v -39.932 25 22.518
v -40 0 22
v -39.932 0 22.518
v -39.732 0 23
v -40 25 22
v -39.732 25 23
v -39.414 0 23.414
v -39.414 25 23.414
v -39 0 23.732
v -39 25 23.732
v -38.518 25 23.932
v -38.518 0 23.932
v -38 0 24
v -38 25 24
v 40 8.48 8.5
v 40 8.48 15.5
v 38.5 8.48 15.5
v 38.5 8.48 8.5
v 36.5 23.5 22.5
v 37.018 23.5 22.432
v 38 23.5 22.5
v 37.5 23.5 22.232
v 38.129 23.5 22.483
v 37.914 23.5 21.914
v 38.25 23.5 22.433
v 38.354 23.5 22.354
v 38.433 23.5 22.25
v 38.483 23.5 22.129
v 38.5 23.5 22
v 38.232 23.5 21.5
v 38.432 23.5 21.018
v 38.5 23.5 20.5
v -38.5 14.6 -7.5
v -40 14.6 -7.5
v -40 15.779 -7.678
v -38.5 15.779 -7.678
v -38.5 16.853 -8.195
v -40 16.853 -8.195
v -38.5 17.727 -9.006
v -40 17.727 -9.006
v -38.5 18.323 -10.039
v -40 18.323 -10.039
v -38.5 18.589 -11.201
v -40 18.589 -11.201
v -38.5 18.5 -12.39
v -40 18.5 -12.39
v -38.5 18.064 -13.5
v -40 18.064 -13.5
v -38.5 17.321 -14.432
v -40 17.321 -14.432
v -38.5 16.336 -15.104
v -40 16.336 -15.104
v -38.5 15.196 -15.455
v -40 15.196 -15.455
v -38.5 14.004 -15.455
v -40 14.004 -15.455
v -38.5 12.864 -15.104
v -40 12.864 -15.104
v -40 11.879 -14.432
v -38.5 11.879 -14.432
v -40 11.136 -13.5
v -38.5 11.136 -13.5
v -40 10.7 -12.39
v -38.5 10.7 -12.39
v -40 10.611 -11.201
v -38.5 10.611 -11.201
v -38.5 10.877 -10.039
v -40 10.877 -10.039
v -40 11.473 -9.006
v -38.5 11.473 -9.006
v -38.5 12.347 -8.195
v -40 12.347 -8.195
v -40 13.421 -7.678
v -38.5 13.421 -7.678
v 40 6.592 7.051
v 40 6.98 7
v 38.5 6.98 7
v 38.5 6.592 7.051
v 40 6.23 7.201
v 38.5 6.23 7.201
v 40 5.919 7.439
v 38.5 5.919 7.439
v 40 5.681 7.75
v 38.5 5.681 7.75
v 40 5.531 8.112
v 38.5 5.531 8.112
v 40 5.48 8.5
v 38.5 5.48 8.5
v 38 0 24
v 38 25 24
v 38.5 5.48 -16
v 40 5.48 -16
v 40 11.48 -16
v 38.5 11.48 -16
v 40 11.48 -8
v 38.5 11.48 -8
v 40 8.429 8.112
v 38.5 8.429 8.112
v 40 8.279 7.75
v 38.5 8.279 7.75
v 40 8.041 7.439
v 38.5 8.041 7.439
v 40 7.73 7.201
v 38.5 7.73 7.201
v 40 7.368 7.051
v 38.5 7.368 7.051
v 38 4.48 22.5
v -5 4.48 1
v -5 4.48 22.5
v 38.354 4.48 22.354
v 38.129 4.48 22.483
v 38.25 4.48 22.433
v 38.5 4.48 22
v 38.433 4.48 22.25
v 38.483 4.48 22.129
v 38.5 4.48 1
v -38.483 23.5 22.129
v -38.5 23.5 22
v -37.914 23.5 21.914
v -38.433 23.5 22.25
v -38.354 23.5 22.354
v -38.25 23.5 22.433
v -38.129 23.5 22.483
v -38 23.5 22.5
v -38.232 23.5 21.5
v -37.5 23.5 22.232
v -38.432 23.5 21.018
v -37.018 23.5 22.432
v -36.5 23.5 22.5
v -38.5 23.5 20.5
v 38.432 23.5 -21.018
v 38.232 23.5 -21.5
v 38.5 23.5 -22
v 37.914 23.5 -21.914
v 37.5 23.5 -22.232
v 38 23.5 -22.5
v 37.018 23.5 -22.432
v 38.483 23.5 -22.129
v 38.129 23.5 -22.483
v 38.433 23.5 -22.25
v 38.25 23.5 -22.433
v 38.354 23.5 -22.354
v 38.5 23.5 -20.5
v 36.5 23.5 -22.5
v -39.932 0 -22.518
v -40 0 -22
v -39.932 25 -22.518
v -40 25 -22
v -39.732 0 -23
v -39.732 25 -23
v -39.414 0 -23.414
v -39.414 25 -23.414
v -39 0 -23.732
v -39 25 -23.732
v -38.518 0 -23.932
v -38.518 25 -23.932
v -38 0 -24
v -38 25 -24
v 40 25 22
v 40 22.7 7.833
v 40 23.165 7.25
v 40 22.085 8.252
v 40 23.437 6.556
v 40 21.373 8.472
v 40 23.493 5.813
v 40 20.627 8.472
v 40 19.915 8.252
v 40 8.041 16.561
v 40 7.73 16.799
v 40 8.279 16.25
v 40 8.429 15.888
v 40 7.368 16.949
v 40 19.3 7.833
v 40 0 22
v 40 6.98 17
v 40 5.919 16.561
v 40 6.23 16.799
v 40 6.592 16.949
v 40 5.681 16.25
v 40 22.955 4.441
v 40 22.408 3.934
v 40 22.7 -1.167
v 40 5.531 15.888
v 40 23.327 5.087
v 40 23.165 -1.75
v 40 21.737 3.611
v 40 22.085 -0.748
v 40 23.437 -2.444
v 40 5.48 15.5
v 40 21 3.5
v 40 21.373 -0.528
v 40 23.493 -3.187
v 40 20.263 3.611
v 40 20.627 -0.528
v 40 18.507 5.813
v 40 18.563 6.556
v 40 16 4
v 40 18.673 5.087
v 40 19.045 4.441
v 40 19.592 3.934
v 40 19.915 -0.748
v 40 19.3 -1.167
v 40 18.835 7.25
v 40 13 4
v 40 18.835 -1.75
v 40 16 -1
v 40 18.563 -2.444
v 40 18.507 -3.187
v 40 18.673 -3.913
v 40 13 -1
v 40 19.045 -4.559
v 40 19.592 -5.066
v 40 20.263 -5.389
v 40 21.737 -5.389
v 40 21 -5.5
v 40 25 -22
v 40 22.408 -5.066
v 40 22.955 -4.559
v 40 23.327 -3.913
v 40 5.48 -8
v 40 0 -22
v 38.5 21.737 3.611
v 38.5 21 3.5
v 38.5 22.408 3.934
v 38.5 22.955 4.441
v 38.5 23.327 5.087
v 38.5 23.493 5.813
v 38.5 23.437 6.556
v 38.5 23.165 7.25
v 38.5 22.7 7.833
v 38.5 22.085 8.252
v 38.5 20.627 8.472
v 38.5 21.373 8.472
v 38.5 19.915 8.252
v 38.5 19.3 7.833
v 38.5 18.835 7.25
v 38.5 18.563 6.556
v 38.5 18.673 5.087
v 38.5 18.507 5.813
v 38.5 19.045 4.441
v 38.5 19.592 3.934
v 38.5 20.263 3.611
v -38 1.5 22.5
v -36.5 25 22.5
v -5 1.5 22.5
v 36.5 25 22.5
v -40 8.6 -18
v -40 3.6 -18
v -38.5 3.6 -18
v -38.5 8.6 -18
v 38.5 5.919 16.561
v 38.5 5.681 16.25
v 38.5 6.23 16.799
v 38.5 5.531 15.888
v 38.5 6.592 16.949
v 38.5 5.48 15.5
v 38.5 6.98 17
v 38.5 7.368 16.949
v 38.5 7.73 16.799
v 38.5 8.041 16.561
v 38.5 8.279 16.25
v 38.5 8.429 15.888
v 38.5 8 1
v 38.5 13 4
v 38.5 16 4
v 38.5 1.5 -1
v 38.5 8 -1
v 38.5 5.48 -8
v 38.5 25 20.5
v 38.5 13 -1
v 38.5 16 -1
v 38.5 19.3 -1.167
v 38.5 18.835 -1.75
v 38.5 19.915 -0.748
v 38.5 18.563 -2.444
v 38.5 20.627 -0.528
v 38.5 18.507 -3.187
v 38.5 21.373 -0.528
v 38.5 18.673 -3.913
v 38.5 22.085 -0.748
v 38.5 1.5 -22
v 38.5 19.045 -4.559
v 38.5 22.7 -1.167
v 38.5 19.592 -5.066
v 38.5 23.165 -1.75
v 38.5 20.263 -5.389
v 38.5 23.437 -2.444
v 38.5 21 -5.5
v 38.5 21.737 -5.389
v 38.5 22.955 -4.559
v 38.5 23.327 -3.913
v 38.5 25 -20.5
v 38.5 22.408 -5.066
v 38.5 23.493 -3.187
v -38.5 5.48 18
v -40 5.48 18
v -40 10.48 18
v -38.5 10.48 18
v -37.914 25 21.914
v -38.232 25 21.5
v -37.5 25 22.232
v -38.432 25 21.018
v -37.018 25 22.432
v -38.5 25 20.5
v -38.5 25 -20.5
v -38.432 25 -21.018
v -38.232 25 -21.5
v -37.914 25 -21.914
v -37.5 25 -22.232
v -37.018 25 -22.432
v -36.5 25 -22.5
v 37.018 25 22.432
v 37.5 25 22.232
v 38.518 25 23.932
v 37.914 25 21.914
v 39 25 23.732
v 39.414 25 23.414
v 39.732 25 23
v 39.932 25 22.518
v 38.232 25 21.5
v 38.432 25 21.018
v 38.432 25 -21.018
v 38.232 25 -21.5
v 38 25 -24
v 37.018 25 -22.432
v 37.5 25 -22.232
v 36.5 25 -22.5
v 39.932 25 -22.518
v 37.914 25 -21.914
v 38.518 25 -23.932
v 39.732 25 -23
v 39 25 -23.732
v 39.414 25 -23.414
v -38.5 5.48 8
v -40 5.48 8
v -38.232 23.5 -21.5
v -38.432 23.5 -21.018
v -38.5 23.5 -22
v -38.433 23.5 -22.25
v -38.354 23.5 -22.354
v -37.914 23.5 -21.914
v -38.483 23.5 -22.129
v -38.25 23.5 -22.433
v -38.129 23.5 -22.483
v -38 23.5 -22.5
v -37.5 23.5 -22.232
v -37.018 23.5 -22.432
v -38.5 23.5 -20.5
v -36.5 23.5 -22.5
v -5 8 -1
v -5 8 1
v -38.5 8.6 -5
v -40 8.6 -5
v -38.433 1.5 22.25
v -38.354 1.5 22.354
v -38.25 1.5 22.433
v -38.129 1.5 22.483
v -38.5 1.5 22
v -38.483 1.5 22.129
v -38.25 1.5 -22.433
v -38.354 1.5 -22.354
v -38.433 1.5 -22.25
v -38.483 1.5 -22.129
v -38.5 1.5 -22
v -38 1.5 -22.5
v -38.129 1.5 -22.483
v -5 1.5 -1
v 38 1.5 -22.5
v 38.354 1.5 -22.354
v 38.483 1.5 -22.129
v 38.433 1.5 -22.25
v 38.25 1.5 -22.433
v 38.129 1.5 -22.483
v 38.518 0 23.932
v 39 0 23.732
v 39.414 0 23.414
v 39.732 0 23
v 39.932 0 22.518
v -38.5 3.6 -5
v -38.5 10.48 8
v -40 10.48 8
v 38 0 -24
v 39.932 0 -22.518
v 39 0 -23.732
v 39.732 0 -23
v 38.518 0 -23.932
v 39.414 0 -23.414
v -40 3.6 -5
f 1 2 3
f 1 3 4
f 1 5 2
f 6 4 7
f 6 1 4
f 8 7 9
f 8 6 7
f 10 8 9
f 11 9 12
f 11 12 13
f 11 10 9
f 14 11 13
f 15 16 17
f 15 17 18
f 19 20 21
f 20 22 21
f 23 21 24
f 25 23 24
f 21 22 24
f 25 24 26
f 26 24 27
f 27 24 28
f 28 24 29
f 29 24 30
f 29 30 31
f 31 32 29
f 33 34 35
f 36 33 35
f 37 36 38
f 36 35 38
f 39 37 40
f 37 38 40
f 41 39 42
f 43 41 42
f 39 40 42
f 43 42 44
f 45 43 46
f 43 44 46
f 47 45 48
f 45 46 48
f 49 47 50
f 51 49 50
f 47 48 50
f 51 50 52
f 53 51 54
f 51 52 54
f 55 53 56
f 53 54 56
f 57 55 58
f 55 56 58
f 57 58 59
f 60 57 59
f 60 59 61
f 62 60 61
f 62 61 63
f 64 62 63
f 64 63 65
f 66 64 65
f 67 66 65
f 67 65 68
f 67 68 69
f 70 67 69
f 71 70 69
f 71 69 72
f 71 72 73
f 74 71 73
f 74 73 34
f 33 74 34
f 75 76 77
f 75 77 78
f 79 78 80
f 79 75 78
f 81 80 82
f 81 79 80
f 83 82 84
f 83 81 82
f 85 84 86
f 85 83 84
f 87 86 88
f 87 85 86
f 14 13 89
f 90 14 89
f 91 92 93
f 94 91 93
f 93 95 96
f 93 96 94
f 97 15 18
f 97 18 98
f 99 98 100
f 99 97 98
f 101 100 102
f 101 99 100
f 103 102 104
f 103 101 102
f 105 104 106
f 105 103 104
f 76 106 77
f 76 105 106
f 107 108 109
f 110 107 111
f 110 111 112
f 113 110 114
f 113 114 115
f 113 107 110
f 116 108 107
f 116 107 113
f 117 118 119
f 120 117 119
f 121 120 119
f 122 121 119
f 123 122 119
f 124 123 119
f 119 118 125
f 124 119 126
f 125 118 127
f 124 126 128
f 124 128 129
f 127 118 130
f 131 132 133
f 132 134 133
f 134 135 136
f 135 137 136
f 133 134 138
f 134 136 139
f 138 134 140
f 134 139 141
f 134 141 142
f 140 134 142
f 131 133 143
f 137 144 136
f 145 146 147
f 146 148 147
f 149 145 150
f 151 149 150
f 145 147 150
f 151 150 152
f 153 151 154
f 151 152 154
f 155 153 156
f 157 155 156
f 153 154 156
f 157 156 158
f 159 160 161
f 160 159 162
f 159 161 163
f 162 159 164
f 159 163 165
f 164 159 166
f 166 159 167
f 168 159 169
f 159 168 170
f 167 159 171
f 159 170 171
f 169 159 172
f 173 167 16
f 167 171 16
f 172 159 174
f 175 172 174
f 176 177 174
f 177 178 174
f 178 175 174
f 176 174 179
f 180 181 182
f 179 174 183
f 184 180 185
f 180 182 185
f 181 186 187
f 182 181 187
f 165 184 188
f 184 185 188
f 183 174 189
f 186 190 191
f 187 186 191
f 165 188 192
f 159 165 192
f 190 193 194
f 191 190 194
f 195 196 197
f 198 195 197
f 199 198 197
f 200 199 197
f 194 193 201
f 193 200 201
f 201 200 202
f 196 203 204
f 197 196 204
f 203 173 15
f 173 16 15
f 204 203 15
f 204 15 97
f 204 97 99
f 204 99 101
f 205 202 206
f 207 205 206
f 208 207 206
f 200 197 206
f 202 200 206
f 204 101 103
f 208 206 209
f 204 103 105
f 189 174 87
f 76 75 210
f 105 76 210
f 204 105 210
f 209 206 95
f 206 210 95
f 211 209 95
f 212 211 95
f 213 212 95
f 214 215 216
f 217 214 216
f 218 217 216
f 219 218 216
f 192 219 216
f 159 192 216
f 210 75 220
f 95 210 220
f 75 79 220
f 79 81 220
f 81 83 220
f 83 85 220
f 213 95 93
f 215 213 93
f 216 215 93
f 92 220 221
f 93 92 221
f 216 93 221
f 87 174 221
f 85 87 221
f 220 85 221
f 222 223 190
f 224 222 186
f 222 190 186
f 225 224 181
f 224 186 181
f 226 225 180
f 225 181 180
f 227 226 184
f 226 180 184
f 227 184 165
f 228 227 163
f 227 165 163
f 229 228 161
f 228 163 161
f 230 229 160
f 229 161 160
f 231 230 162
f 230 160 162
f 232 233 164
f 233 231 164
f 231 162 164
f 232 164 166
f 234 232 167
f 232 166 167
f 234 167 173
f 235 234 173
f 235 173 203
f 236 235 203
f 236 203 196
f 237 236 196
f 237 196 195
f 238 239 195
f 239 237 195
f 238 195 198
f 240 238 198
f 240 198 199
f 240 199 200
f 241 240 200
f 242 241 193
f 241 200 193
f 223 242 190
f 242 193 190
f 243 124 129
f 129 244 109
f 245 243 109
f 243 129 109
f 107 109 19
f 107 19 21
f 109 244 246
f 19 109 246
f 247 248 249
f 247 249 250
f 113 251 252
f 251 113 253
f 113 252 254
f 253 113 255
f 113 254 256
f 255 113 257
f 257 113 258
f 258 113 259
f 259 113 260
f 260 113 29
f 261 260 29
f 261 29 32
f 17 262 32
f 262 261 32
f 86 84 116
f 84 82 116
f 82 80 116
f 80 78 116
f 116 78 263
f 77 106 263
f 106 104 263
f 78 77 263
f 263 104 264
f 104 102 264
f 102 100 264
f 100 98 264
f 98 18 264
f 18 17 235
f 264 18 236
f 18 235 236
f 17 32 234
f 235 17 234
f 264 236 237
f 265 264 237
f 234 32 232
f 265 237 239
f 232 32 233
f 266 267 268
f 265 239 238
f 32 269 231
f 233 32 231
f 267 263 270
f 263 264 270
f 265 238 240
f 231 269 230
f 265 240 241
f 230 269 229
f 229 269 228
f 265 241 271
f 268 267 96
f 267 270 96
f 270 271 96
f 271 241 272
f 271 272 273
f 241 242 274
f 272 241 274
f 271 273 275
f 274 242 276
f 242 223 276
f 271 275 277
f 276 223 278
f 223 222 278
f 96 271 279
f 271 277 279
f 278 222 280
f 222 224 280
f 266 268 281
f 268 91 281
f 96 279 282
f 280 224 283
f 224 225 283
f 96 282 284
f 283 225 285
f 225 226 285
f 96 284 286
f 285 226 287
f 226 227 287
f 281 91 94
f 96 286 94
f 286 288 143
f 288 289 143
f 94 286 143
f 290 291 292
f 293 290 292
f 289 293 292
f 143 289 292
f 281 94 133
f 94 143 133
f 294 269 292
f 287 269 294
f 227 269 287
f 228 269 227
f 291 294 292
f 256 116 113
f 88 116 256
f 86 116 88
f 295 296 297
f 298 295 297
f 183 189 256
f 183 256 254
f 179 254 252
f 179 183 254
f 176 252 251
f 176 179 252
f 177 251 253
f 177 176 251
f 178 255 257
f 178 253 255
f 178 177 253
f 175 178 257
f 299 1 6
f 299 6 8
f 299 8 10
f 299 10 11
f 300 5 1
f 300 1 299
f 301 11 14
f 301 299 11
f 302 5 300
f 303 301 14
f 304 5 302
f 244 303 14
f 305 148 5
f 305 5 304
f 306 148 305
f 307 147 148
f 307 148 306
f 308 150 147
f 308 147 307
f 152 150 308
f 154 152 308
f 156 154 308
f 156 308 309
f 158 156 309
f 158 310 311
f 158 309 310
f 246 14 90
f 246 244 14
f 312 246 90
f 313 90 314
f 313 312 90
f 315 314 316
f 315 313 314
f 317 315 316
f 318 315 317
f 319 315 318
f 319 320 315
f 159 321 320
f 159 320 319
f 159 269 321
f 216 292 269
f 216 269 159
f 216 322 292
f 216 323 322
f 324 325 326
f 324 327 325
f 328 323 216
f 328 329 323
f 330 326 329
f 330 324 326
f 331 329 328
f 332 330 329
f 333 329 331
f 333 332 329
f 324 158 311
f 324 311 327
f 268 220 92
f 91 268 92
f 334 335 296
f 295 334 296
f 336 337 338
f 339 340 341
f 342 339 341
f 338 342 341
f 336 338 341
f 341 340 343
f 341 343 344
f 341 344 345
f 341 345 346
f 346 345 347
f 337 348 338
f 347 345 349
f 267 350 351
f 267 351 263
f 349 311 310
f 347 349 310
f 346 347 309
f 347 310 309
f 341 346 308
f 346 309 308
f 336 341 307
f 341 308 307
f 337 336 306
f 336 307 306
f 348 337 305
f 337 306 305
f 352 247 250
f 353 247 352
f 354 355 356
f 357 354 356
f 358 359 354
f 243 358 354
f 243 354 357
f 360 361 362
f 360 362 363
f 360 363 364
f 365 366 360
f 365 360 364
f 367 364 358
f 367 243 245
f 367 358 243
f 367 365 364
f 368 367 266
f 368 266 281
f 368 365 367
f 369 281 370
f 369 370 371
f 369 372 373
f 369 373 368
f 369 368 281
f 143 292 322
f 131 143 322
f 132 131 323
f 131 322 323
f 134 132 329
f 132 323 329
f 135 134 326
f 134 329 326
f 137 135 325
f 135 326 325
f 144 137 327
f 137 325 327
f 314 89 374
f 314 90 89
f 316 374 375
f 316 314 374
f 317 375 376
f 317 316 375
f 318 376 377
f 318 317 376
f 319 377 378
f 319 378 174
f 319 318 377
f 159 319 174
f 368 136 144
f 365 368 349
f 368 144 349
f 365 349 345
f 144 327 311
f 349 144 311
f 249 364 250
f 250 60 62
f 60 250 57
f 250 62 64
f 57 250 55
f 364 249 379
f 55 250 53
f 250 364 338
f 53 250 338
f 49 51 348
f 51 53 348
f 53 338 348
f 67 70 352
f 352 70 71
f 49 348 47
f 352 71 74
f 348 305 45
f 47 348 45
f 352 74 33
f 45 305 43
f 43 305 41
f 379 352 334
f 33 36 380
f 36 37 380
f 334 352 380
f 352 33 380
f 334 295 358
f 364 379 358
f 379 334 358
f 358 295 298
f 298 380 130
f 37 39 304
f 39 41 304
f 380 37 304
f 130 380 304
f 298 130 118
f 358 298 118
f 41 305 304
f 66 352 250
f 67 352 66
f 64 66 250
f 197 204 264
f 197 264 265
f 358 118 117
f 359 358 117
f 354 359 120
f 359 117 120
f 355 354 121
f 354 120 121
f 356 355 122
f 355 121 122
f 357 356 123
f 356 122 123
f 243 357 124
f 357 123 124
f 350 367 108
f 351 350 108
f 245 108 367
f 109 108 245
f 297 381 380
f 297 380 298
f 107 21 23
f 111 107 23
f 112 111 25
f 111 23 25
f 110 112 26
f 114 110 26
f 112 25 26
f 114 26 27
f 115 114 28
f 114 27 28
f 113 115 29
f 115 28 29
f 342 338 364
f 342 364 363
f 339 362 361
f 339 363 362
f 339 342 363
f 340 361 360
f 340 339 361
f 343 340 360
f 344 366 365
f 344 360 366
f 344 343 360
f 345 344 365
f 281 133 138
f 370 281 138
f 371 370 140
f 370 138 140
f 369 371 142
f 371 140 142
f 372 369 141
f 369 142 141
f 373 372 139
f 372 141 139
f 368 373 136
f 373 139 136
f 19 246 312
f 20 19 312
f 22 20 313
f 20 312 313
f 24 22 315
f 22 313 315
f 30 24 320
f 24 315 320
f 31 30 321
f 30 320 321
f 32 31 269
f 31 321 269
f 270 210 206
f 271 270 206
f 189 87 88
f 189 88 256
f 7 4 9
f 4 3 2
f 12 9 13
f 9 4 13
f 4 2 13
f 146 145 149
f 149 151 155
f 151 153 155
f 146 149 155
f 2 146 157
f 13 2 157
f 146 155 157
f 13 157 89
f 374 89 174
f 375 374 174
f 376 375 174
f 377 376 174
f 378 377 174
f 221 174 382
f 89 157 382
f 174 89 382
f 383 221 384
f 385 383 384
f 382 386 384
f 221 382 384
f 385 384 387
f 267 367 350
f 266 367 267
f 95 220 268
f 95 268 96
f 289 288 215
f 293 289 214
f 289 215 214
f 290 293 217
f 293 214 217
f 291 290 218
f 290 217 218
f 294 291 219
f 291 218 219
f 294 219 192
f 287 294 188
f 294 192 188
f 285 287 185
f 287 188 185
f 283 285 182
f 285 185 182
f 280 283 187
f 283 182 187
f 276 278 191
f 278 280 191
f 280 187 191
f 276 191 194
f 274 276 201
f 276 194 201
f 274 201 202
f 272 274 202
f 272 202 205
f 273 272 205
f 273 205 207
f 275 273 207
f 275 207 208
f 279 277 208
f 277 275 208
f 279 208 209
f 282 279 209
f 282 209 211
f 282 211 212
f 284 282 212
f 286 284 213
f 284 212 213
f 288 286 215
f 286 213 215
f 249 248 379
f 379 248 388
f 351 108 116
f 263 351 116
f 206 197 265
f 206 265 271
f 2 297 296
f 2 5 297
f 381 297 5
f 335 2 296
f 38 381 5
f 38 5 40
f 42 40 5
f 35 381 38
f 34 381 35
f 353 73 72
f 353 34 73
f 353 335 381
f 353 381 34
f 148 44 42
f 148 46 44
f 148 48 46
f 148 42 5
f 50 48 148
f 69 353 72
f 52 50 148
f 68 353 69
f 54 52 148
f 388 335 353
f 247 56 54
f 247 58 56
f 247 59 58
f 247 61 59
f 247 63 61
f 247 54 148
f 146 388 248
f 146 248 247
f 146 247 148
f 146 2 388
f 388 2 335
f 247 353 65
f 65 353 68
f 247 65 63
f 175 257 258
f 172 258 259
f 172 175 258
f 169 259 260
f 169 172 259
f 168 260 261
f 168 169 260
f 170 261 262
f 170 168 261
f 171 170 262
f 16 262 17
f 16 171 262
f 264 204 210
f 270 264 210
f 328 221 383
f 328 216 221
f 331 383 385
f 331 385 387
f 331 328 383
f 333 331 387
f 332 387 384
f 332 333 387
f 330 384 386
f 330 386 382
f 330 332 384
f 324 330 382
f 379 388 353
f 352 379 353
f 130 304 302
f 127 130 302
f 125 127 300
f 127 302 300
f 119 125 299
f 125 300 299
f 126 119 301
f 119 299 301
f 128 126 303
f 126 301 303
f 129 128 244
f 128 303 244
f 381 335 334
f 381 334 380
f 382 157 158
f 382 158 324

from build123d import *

# Parameters (mm, degrees)
SKETCH_3_W           = 80
SKETCH_3_H           = 48
EXTRUDE_1_DEPTH      = 25
FILLET_1_R           = 2
SHELL_1_T            = 1.5
SKETCH_5_W           = 45
SKETCH_5_H           = 2
EXTRUDE_2_DEPTH      = 8
EXTRUDE_START        = 4.48
EXTRUDE_3_DEPTH      = 4.48
SKETCH_8_W           = 8
SKETCH_8_H           = 6
CUT_EXTRUDE_2_DEPTH  = 4.03
CUT_EXTRUDE_3_DEPTH  = 4.03
SKETCH_11_W          = 13
SKETCH_11_H          = 5
CUT_EXTRUDE_4_DEPTH  = 4.03
SKETCH_12_W          = 5
SKETCH_12_H          = 3
CUT_EXTRUDE_5_DEPTH  = 4.03
SKETCH_13_R          = 2.5
CUT_EXTRUDE_6_DEPTH  = 4.03
SKETCH_14_R          = 4
CUT_EXTRUDE_7_DEPTH  = 4.03
CUT_EXTRUDE_12_DEPTH = 4.03
SKETCH_16_W          = 10
SKETCH_16_H          = 5
CUT_EXTRUDE_13_DEPTH = 4.03


with BuildPart() as part:
    # Эскиз3 → Бобышка-Вытянуть1 (new body)
    with BuildSketch(Plane(origin=(0, 0, 0), x_dir=(1, 0, 0), z_dir=(0, 1, 0))):
        Rectangle(SKETCH_3_W, SKETCH_3_H)
    extrude(amount=EXTRUDE_1_DEPTH)

    # Скругление1
    fillet_1_edges = [part.edges().sort_by_distance(p)[0] for p in [
        (40, 12.5, -24),
        (40, 12.5, 24),
        (-40, 12.5, 24),
        (-40, 12.5, -24),
    ]]
    fillet(fillet_1_edges, radius=FILLET_1_R)

    # Оболочка1 (no face opened: a closed hollow body)
    add(offset(amount=-SHELL_1_T, mode=Mode.PRIVATE), mode=Mode.SUBTRACT)

    # Эскиз5 → Бобышка-Вытянуть2 (add)
    with BuildSketch(Plane(origin=(0, 0, 0), x_dir=(1, 0, 0), z_dir=(0, 1, 0))):
        with Locations((17.5, 0)):
            Rectangle(SKETCH_5_W, SKETCH_5_H)
    extrude(amount=EXTRUDE_2_DEPTH)

    # Эскиз7 → Бобышка-Вытянуть3 (add)
    with BuildSketch(Plane(origin=(0, 0, 0), x_dir=(1, 0, 0), z_dir=(0, 1, 0)).offset(EXTRUDE_START)):
        with BuildLine():
            Line((40, -1), (-5, -1))
            Line((-5, -1), (-5, -24))
            Line((-5, -24), (38, -24))
            ThreePointArc((38, -24), (39.414213562, -23.414213562), (40, -22))
            Line((40, -22), (40, -1))
        make_face()
    extrude(amount=-EXTRUDE_3_DEPTH)

    # Эскиз8 → Вырез-Вытянуть2 (cut)
    with BuildSketch(Plane(origin=(40, 0, 0), x_dir=(0, 0, -1), z_dir=(1, 0, 0))):
        with Locations((12, 8.48)):
            Rectangle(SKETCH_8_W, SKETCH_8_H)
    extrude(amount=-CUT_EXTRUDE_2_DEPTH, mode=Mode.SUBTRACT)

    # Эскиз8<4> → Вырез-Вытянуть3 (cut)
    with BuildSketch(Plane(origin=(40, 0, 0), x_dir=(0, 0, -1), z_dir=(1, 0, 0))):
        with BuildLine():
            Line((-15.5, 5.48), (-8.5, 5.48))
            ThreePointArc((-8.5, 5.48), (-7.439339828, 5.919339828), (-7, 6.98))
            ThreePointArc((-7, 6.98), (-7.439339828, 8.040660172), (-8.5, 8.48))
            Line((-8.5, 8.48), (-15.5, 8.48))
            ThreePointArc((-15.5, 8.48), (-16.560660172, 8.040660172), (-17, 6.98))
            ThreePointArc((-17, 6.98), (-16.560660172, 5.919339828), (-15.5, 5.48))
        make_face()
    extrude(amount=-CUT_EXTRUDE_3_DEPTH, mode=Mode.SUBTRACT)

    # Эскиз11 → Вырез-Вытянуть4 (cut)
    with BuildSketch(Plane.ZY.offset(40)):
        with Locations((-11.5, 6.1)):
            Rectangle(SKETCH_11_W, SKETCH_11_H)
    extrude(amount=-CUT_EXTRUDE_4_DEPTH, mode=Mode.SUBTRACT)

    # Эскиз12 → Вырез-Вытянуть5 (cut)
    with BuildSketch(Plane(origin=(40, 0, 0), x_dir=(0, 0, -1), z_dir=(1, 0, 0))):
        with Locations((-1.5, 14.5)):
            Rectangle(SKETCH_12_W, SKETCH_12_H)
    extrude(amount=-CUT_EXTRUDE_5_DEPTH, mode=Mode.SUBTRACT)

    # Эскиз13 → Вырез-Вытянуть6 (cut)
    with BuildSketch(Plane(origin=(40, 0, 0), x_dir=(0, 0, -1), z_dir=(1, 0, 0))):
        with Locations((3, 21)):
            Circle(SKETCH_13_R)
        with Locations((-6, 21)):
            Circle(SKETCH_13_R)
    extrude(amount=-CUT_EXTRUDE_6_DEPTH, mode=Mode.SUBTRACT)

    # Эскиз14 → Вырез-Вытянуть7 (cut)
    with BuildSketch(Plane.ZY.offset(40)):
        with Locations((-11.5, 14.6)):
            Circle(SKETCH_14_R)
    extrude(amount=-CUT_EXTRUDE_7_DEPTH, mode=Mode.SUBTRACT)

    # Эскиз15 → Вырез-Вытянуть12 (cut)
    with BuildSketch(Plane(origin=(0, 25, 0), x_dir=(1, 0, 0), z_dir=(0, 1, 0))):
        with BuildLine():
            Line((38.5, -20.5), (38.5, 20.5))
            ThreePointArc((38.5, 20.5), (37.914213562, 21.914213562), (36.5, 22.5))
            Line((36.5, 22.5), (-36.5, 22.5))
            ThreePointArc((-36.5, 22.5), (-37.914213562, 21.914213562), (-38.5, 20.5))
            Line((-38.5, 20.5), (-38.5, -20.5))
            ThreePointArc((-38.5, -20.5), (-37.914213562, -21.914213562), (-36.5, -22.5))
            Line((-36.5, -22.5), (36.5, -22.5))
            ThreePointArc((36.5, -22.5), (37.914213562, -21.914213562), (38.5, -20.5))
        make_face()
    extrude(amount=-CUT_EXTRUDE_12_DEPTH, mode=Mode.SUBTRACT)

    # Эскиз16 → Вырез-Вытянуть13 (cut)
    with BuildSketch(Plane.ZY.offset(40)):
        with Locations((13, 7.98)):
            Rectangle(SKETCH_16_W, SKETCH_16_H)
    extrude(amount=-CUT_EXTRUDE_13_DEPTH, mode=Mode.SUBTRACT)


solid = part.part
